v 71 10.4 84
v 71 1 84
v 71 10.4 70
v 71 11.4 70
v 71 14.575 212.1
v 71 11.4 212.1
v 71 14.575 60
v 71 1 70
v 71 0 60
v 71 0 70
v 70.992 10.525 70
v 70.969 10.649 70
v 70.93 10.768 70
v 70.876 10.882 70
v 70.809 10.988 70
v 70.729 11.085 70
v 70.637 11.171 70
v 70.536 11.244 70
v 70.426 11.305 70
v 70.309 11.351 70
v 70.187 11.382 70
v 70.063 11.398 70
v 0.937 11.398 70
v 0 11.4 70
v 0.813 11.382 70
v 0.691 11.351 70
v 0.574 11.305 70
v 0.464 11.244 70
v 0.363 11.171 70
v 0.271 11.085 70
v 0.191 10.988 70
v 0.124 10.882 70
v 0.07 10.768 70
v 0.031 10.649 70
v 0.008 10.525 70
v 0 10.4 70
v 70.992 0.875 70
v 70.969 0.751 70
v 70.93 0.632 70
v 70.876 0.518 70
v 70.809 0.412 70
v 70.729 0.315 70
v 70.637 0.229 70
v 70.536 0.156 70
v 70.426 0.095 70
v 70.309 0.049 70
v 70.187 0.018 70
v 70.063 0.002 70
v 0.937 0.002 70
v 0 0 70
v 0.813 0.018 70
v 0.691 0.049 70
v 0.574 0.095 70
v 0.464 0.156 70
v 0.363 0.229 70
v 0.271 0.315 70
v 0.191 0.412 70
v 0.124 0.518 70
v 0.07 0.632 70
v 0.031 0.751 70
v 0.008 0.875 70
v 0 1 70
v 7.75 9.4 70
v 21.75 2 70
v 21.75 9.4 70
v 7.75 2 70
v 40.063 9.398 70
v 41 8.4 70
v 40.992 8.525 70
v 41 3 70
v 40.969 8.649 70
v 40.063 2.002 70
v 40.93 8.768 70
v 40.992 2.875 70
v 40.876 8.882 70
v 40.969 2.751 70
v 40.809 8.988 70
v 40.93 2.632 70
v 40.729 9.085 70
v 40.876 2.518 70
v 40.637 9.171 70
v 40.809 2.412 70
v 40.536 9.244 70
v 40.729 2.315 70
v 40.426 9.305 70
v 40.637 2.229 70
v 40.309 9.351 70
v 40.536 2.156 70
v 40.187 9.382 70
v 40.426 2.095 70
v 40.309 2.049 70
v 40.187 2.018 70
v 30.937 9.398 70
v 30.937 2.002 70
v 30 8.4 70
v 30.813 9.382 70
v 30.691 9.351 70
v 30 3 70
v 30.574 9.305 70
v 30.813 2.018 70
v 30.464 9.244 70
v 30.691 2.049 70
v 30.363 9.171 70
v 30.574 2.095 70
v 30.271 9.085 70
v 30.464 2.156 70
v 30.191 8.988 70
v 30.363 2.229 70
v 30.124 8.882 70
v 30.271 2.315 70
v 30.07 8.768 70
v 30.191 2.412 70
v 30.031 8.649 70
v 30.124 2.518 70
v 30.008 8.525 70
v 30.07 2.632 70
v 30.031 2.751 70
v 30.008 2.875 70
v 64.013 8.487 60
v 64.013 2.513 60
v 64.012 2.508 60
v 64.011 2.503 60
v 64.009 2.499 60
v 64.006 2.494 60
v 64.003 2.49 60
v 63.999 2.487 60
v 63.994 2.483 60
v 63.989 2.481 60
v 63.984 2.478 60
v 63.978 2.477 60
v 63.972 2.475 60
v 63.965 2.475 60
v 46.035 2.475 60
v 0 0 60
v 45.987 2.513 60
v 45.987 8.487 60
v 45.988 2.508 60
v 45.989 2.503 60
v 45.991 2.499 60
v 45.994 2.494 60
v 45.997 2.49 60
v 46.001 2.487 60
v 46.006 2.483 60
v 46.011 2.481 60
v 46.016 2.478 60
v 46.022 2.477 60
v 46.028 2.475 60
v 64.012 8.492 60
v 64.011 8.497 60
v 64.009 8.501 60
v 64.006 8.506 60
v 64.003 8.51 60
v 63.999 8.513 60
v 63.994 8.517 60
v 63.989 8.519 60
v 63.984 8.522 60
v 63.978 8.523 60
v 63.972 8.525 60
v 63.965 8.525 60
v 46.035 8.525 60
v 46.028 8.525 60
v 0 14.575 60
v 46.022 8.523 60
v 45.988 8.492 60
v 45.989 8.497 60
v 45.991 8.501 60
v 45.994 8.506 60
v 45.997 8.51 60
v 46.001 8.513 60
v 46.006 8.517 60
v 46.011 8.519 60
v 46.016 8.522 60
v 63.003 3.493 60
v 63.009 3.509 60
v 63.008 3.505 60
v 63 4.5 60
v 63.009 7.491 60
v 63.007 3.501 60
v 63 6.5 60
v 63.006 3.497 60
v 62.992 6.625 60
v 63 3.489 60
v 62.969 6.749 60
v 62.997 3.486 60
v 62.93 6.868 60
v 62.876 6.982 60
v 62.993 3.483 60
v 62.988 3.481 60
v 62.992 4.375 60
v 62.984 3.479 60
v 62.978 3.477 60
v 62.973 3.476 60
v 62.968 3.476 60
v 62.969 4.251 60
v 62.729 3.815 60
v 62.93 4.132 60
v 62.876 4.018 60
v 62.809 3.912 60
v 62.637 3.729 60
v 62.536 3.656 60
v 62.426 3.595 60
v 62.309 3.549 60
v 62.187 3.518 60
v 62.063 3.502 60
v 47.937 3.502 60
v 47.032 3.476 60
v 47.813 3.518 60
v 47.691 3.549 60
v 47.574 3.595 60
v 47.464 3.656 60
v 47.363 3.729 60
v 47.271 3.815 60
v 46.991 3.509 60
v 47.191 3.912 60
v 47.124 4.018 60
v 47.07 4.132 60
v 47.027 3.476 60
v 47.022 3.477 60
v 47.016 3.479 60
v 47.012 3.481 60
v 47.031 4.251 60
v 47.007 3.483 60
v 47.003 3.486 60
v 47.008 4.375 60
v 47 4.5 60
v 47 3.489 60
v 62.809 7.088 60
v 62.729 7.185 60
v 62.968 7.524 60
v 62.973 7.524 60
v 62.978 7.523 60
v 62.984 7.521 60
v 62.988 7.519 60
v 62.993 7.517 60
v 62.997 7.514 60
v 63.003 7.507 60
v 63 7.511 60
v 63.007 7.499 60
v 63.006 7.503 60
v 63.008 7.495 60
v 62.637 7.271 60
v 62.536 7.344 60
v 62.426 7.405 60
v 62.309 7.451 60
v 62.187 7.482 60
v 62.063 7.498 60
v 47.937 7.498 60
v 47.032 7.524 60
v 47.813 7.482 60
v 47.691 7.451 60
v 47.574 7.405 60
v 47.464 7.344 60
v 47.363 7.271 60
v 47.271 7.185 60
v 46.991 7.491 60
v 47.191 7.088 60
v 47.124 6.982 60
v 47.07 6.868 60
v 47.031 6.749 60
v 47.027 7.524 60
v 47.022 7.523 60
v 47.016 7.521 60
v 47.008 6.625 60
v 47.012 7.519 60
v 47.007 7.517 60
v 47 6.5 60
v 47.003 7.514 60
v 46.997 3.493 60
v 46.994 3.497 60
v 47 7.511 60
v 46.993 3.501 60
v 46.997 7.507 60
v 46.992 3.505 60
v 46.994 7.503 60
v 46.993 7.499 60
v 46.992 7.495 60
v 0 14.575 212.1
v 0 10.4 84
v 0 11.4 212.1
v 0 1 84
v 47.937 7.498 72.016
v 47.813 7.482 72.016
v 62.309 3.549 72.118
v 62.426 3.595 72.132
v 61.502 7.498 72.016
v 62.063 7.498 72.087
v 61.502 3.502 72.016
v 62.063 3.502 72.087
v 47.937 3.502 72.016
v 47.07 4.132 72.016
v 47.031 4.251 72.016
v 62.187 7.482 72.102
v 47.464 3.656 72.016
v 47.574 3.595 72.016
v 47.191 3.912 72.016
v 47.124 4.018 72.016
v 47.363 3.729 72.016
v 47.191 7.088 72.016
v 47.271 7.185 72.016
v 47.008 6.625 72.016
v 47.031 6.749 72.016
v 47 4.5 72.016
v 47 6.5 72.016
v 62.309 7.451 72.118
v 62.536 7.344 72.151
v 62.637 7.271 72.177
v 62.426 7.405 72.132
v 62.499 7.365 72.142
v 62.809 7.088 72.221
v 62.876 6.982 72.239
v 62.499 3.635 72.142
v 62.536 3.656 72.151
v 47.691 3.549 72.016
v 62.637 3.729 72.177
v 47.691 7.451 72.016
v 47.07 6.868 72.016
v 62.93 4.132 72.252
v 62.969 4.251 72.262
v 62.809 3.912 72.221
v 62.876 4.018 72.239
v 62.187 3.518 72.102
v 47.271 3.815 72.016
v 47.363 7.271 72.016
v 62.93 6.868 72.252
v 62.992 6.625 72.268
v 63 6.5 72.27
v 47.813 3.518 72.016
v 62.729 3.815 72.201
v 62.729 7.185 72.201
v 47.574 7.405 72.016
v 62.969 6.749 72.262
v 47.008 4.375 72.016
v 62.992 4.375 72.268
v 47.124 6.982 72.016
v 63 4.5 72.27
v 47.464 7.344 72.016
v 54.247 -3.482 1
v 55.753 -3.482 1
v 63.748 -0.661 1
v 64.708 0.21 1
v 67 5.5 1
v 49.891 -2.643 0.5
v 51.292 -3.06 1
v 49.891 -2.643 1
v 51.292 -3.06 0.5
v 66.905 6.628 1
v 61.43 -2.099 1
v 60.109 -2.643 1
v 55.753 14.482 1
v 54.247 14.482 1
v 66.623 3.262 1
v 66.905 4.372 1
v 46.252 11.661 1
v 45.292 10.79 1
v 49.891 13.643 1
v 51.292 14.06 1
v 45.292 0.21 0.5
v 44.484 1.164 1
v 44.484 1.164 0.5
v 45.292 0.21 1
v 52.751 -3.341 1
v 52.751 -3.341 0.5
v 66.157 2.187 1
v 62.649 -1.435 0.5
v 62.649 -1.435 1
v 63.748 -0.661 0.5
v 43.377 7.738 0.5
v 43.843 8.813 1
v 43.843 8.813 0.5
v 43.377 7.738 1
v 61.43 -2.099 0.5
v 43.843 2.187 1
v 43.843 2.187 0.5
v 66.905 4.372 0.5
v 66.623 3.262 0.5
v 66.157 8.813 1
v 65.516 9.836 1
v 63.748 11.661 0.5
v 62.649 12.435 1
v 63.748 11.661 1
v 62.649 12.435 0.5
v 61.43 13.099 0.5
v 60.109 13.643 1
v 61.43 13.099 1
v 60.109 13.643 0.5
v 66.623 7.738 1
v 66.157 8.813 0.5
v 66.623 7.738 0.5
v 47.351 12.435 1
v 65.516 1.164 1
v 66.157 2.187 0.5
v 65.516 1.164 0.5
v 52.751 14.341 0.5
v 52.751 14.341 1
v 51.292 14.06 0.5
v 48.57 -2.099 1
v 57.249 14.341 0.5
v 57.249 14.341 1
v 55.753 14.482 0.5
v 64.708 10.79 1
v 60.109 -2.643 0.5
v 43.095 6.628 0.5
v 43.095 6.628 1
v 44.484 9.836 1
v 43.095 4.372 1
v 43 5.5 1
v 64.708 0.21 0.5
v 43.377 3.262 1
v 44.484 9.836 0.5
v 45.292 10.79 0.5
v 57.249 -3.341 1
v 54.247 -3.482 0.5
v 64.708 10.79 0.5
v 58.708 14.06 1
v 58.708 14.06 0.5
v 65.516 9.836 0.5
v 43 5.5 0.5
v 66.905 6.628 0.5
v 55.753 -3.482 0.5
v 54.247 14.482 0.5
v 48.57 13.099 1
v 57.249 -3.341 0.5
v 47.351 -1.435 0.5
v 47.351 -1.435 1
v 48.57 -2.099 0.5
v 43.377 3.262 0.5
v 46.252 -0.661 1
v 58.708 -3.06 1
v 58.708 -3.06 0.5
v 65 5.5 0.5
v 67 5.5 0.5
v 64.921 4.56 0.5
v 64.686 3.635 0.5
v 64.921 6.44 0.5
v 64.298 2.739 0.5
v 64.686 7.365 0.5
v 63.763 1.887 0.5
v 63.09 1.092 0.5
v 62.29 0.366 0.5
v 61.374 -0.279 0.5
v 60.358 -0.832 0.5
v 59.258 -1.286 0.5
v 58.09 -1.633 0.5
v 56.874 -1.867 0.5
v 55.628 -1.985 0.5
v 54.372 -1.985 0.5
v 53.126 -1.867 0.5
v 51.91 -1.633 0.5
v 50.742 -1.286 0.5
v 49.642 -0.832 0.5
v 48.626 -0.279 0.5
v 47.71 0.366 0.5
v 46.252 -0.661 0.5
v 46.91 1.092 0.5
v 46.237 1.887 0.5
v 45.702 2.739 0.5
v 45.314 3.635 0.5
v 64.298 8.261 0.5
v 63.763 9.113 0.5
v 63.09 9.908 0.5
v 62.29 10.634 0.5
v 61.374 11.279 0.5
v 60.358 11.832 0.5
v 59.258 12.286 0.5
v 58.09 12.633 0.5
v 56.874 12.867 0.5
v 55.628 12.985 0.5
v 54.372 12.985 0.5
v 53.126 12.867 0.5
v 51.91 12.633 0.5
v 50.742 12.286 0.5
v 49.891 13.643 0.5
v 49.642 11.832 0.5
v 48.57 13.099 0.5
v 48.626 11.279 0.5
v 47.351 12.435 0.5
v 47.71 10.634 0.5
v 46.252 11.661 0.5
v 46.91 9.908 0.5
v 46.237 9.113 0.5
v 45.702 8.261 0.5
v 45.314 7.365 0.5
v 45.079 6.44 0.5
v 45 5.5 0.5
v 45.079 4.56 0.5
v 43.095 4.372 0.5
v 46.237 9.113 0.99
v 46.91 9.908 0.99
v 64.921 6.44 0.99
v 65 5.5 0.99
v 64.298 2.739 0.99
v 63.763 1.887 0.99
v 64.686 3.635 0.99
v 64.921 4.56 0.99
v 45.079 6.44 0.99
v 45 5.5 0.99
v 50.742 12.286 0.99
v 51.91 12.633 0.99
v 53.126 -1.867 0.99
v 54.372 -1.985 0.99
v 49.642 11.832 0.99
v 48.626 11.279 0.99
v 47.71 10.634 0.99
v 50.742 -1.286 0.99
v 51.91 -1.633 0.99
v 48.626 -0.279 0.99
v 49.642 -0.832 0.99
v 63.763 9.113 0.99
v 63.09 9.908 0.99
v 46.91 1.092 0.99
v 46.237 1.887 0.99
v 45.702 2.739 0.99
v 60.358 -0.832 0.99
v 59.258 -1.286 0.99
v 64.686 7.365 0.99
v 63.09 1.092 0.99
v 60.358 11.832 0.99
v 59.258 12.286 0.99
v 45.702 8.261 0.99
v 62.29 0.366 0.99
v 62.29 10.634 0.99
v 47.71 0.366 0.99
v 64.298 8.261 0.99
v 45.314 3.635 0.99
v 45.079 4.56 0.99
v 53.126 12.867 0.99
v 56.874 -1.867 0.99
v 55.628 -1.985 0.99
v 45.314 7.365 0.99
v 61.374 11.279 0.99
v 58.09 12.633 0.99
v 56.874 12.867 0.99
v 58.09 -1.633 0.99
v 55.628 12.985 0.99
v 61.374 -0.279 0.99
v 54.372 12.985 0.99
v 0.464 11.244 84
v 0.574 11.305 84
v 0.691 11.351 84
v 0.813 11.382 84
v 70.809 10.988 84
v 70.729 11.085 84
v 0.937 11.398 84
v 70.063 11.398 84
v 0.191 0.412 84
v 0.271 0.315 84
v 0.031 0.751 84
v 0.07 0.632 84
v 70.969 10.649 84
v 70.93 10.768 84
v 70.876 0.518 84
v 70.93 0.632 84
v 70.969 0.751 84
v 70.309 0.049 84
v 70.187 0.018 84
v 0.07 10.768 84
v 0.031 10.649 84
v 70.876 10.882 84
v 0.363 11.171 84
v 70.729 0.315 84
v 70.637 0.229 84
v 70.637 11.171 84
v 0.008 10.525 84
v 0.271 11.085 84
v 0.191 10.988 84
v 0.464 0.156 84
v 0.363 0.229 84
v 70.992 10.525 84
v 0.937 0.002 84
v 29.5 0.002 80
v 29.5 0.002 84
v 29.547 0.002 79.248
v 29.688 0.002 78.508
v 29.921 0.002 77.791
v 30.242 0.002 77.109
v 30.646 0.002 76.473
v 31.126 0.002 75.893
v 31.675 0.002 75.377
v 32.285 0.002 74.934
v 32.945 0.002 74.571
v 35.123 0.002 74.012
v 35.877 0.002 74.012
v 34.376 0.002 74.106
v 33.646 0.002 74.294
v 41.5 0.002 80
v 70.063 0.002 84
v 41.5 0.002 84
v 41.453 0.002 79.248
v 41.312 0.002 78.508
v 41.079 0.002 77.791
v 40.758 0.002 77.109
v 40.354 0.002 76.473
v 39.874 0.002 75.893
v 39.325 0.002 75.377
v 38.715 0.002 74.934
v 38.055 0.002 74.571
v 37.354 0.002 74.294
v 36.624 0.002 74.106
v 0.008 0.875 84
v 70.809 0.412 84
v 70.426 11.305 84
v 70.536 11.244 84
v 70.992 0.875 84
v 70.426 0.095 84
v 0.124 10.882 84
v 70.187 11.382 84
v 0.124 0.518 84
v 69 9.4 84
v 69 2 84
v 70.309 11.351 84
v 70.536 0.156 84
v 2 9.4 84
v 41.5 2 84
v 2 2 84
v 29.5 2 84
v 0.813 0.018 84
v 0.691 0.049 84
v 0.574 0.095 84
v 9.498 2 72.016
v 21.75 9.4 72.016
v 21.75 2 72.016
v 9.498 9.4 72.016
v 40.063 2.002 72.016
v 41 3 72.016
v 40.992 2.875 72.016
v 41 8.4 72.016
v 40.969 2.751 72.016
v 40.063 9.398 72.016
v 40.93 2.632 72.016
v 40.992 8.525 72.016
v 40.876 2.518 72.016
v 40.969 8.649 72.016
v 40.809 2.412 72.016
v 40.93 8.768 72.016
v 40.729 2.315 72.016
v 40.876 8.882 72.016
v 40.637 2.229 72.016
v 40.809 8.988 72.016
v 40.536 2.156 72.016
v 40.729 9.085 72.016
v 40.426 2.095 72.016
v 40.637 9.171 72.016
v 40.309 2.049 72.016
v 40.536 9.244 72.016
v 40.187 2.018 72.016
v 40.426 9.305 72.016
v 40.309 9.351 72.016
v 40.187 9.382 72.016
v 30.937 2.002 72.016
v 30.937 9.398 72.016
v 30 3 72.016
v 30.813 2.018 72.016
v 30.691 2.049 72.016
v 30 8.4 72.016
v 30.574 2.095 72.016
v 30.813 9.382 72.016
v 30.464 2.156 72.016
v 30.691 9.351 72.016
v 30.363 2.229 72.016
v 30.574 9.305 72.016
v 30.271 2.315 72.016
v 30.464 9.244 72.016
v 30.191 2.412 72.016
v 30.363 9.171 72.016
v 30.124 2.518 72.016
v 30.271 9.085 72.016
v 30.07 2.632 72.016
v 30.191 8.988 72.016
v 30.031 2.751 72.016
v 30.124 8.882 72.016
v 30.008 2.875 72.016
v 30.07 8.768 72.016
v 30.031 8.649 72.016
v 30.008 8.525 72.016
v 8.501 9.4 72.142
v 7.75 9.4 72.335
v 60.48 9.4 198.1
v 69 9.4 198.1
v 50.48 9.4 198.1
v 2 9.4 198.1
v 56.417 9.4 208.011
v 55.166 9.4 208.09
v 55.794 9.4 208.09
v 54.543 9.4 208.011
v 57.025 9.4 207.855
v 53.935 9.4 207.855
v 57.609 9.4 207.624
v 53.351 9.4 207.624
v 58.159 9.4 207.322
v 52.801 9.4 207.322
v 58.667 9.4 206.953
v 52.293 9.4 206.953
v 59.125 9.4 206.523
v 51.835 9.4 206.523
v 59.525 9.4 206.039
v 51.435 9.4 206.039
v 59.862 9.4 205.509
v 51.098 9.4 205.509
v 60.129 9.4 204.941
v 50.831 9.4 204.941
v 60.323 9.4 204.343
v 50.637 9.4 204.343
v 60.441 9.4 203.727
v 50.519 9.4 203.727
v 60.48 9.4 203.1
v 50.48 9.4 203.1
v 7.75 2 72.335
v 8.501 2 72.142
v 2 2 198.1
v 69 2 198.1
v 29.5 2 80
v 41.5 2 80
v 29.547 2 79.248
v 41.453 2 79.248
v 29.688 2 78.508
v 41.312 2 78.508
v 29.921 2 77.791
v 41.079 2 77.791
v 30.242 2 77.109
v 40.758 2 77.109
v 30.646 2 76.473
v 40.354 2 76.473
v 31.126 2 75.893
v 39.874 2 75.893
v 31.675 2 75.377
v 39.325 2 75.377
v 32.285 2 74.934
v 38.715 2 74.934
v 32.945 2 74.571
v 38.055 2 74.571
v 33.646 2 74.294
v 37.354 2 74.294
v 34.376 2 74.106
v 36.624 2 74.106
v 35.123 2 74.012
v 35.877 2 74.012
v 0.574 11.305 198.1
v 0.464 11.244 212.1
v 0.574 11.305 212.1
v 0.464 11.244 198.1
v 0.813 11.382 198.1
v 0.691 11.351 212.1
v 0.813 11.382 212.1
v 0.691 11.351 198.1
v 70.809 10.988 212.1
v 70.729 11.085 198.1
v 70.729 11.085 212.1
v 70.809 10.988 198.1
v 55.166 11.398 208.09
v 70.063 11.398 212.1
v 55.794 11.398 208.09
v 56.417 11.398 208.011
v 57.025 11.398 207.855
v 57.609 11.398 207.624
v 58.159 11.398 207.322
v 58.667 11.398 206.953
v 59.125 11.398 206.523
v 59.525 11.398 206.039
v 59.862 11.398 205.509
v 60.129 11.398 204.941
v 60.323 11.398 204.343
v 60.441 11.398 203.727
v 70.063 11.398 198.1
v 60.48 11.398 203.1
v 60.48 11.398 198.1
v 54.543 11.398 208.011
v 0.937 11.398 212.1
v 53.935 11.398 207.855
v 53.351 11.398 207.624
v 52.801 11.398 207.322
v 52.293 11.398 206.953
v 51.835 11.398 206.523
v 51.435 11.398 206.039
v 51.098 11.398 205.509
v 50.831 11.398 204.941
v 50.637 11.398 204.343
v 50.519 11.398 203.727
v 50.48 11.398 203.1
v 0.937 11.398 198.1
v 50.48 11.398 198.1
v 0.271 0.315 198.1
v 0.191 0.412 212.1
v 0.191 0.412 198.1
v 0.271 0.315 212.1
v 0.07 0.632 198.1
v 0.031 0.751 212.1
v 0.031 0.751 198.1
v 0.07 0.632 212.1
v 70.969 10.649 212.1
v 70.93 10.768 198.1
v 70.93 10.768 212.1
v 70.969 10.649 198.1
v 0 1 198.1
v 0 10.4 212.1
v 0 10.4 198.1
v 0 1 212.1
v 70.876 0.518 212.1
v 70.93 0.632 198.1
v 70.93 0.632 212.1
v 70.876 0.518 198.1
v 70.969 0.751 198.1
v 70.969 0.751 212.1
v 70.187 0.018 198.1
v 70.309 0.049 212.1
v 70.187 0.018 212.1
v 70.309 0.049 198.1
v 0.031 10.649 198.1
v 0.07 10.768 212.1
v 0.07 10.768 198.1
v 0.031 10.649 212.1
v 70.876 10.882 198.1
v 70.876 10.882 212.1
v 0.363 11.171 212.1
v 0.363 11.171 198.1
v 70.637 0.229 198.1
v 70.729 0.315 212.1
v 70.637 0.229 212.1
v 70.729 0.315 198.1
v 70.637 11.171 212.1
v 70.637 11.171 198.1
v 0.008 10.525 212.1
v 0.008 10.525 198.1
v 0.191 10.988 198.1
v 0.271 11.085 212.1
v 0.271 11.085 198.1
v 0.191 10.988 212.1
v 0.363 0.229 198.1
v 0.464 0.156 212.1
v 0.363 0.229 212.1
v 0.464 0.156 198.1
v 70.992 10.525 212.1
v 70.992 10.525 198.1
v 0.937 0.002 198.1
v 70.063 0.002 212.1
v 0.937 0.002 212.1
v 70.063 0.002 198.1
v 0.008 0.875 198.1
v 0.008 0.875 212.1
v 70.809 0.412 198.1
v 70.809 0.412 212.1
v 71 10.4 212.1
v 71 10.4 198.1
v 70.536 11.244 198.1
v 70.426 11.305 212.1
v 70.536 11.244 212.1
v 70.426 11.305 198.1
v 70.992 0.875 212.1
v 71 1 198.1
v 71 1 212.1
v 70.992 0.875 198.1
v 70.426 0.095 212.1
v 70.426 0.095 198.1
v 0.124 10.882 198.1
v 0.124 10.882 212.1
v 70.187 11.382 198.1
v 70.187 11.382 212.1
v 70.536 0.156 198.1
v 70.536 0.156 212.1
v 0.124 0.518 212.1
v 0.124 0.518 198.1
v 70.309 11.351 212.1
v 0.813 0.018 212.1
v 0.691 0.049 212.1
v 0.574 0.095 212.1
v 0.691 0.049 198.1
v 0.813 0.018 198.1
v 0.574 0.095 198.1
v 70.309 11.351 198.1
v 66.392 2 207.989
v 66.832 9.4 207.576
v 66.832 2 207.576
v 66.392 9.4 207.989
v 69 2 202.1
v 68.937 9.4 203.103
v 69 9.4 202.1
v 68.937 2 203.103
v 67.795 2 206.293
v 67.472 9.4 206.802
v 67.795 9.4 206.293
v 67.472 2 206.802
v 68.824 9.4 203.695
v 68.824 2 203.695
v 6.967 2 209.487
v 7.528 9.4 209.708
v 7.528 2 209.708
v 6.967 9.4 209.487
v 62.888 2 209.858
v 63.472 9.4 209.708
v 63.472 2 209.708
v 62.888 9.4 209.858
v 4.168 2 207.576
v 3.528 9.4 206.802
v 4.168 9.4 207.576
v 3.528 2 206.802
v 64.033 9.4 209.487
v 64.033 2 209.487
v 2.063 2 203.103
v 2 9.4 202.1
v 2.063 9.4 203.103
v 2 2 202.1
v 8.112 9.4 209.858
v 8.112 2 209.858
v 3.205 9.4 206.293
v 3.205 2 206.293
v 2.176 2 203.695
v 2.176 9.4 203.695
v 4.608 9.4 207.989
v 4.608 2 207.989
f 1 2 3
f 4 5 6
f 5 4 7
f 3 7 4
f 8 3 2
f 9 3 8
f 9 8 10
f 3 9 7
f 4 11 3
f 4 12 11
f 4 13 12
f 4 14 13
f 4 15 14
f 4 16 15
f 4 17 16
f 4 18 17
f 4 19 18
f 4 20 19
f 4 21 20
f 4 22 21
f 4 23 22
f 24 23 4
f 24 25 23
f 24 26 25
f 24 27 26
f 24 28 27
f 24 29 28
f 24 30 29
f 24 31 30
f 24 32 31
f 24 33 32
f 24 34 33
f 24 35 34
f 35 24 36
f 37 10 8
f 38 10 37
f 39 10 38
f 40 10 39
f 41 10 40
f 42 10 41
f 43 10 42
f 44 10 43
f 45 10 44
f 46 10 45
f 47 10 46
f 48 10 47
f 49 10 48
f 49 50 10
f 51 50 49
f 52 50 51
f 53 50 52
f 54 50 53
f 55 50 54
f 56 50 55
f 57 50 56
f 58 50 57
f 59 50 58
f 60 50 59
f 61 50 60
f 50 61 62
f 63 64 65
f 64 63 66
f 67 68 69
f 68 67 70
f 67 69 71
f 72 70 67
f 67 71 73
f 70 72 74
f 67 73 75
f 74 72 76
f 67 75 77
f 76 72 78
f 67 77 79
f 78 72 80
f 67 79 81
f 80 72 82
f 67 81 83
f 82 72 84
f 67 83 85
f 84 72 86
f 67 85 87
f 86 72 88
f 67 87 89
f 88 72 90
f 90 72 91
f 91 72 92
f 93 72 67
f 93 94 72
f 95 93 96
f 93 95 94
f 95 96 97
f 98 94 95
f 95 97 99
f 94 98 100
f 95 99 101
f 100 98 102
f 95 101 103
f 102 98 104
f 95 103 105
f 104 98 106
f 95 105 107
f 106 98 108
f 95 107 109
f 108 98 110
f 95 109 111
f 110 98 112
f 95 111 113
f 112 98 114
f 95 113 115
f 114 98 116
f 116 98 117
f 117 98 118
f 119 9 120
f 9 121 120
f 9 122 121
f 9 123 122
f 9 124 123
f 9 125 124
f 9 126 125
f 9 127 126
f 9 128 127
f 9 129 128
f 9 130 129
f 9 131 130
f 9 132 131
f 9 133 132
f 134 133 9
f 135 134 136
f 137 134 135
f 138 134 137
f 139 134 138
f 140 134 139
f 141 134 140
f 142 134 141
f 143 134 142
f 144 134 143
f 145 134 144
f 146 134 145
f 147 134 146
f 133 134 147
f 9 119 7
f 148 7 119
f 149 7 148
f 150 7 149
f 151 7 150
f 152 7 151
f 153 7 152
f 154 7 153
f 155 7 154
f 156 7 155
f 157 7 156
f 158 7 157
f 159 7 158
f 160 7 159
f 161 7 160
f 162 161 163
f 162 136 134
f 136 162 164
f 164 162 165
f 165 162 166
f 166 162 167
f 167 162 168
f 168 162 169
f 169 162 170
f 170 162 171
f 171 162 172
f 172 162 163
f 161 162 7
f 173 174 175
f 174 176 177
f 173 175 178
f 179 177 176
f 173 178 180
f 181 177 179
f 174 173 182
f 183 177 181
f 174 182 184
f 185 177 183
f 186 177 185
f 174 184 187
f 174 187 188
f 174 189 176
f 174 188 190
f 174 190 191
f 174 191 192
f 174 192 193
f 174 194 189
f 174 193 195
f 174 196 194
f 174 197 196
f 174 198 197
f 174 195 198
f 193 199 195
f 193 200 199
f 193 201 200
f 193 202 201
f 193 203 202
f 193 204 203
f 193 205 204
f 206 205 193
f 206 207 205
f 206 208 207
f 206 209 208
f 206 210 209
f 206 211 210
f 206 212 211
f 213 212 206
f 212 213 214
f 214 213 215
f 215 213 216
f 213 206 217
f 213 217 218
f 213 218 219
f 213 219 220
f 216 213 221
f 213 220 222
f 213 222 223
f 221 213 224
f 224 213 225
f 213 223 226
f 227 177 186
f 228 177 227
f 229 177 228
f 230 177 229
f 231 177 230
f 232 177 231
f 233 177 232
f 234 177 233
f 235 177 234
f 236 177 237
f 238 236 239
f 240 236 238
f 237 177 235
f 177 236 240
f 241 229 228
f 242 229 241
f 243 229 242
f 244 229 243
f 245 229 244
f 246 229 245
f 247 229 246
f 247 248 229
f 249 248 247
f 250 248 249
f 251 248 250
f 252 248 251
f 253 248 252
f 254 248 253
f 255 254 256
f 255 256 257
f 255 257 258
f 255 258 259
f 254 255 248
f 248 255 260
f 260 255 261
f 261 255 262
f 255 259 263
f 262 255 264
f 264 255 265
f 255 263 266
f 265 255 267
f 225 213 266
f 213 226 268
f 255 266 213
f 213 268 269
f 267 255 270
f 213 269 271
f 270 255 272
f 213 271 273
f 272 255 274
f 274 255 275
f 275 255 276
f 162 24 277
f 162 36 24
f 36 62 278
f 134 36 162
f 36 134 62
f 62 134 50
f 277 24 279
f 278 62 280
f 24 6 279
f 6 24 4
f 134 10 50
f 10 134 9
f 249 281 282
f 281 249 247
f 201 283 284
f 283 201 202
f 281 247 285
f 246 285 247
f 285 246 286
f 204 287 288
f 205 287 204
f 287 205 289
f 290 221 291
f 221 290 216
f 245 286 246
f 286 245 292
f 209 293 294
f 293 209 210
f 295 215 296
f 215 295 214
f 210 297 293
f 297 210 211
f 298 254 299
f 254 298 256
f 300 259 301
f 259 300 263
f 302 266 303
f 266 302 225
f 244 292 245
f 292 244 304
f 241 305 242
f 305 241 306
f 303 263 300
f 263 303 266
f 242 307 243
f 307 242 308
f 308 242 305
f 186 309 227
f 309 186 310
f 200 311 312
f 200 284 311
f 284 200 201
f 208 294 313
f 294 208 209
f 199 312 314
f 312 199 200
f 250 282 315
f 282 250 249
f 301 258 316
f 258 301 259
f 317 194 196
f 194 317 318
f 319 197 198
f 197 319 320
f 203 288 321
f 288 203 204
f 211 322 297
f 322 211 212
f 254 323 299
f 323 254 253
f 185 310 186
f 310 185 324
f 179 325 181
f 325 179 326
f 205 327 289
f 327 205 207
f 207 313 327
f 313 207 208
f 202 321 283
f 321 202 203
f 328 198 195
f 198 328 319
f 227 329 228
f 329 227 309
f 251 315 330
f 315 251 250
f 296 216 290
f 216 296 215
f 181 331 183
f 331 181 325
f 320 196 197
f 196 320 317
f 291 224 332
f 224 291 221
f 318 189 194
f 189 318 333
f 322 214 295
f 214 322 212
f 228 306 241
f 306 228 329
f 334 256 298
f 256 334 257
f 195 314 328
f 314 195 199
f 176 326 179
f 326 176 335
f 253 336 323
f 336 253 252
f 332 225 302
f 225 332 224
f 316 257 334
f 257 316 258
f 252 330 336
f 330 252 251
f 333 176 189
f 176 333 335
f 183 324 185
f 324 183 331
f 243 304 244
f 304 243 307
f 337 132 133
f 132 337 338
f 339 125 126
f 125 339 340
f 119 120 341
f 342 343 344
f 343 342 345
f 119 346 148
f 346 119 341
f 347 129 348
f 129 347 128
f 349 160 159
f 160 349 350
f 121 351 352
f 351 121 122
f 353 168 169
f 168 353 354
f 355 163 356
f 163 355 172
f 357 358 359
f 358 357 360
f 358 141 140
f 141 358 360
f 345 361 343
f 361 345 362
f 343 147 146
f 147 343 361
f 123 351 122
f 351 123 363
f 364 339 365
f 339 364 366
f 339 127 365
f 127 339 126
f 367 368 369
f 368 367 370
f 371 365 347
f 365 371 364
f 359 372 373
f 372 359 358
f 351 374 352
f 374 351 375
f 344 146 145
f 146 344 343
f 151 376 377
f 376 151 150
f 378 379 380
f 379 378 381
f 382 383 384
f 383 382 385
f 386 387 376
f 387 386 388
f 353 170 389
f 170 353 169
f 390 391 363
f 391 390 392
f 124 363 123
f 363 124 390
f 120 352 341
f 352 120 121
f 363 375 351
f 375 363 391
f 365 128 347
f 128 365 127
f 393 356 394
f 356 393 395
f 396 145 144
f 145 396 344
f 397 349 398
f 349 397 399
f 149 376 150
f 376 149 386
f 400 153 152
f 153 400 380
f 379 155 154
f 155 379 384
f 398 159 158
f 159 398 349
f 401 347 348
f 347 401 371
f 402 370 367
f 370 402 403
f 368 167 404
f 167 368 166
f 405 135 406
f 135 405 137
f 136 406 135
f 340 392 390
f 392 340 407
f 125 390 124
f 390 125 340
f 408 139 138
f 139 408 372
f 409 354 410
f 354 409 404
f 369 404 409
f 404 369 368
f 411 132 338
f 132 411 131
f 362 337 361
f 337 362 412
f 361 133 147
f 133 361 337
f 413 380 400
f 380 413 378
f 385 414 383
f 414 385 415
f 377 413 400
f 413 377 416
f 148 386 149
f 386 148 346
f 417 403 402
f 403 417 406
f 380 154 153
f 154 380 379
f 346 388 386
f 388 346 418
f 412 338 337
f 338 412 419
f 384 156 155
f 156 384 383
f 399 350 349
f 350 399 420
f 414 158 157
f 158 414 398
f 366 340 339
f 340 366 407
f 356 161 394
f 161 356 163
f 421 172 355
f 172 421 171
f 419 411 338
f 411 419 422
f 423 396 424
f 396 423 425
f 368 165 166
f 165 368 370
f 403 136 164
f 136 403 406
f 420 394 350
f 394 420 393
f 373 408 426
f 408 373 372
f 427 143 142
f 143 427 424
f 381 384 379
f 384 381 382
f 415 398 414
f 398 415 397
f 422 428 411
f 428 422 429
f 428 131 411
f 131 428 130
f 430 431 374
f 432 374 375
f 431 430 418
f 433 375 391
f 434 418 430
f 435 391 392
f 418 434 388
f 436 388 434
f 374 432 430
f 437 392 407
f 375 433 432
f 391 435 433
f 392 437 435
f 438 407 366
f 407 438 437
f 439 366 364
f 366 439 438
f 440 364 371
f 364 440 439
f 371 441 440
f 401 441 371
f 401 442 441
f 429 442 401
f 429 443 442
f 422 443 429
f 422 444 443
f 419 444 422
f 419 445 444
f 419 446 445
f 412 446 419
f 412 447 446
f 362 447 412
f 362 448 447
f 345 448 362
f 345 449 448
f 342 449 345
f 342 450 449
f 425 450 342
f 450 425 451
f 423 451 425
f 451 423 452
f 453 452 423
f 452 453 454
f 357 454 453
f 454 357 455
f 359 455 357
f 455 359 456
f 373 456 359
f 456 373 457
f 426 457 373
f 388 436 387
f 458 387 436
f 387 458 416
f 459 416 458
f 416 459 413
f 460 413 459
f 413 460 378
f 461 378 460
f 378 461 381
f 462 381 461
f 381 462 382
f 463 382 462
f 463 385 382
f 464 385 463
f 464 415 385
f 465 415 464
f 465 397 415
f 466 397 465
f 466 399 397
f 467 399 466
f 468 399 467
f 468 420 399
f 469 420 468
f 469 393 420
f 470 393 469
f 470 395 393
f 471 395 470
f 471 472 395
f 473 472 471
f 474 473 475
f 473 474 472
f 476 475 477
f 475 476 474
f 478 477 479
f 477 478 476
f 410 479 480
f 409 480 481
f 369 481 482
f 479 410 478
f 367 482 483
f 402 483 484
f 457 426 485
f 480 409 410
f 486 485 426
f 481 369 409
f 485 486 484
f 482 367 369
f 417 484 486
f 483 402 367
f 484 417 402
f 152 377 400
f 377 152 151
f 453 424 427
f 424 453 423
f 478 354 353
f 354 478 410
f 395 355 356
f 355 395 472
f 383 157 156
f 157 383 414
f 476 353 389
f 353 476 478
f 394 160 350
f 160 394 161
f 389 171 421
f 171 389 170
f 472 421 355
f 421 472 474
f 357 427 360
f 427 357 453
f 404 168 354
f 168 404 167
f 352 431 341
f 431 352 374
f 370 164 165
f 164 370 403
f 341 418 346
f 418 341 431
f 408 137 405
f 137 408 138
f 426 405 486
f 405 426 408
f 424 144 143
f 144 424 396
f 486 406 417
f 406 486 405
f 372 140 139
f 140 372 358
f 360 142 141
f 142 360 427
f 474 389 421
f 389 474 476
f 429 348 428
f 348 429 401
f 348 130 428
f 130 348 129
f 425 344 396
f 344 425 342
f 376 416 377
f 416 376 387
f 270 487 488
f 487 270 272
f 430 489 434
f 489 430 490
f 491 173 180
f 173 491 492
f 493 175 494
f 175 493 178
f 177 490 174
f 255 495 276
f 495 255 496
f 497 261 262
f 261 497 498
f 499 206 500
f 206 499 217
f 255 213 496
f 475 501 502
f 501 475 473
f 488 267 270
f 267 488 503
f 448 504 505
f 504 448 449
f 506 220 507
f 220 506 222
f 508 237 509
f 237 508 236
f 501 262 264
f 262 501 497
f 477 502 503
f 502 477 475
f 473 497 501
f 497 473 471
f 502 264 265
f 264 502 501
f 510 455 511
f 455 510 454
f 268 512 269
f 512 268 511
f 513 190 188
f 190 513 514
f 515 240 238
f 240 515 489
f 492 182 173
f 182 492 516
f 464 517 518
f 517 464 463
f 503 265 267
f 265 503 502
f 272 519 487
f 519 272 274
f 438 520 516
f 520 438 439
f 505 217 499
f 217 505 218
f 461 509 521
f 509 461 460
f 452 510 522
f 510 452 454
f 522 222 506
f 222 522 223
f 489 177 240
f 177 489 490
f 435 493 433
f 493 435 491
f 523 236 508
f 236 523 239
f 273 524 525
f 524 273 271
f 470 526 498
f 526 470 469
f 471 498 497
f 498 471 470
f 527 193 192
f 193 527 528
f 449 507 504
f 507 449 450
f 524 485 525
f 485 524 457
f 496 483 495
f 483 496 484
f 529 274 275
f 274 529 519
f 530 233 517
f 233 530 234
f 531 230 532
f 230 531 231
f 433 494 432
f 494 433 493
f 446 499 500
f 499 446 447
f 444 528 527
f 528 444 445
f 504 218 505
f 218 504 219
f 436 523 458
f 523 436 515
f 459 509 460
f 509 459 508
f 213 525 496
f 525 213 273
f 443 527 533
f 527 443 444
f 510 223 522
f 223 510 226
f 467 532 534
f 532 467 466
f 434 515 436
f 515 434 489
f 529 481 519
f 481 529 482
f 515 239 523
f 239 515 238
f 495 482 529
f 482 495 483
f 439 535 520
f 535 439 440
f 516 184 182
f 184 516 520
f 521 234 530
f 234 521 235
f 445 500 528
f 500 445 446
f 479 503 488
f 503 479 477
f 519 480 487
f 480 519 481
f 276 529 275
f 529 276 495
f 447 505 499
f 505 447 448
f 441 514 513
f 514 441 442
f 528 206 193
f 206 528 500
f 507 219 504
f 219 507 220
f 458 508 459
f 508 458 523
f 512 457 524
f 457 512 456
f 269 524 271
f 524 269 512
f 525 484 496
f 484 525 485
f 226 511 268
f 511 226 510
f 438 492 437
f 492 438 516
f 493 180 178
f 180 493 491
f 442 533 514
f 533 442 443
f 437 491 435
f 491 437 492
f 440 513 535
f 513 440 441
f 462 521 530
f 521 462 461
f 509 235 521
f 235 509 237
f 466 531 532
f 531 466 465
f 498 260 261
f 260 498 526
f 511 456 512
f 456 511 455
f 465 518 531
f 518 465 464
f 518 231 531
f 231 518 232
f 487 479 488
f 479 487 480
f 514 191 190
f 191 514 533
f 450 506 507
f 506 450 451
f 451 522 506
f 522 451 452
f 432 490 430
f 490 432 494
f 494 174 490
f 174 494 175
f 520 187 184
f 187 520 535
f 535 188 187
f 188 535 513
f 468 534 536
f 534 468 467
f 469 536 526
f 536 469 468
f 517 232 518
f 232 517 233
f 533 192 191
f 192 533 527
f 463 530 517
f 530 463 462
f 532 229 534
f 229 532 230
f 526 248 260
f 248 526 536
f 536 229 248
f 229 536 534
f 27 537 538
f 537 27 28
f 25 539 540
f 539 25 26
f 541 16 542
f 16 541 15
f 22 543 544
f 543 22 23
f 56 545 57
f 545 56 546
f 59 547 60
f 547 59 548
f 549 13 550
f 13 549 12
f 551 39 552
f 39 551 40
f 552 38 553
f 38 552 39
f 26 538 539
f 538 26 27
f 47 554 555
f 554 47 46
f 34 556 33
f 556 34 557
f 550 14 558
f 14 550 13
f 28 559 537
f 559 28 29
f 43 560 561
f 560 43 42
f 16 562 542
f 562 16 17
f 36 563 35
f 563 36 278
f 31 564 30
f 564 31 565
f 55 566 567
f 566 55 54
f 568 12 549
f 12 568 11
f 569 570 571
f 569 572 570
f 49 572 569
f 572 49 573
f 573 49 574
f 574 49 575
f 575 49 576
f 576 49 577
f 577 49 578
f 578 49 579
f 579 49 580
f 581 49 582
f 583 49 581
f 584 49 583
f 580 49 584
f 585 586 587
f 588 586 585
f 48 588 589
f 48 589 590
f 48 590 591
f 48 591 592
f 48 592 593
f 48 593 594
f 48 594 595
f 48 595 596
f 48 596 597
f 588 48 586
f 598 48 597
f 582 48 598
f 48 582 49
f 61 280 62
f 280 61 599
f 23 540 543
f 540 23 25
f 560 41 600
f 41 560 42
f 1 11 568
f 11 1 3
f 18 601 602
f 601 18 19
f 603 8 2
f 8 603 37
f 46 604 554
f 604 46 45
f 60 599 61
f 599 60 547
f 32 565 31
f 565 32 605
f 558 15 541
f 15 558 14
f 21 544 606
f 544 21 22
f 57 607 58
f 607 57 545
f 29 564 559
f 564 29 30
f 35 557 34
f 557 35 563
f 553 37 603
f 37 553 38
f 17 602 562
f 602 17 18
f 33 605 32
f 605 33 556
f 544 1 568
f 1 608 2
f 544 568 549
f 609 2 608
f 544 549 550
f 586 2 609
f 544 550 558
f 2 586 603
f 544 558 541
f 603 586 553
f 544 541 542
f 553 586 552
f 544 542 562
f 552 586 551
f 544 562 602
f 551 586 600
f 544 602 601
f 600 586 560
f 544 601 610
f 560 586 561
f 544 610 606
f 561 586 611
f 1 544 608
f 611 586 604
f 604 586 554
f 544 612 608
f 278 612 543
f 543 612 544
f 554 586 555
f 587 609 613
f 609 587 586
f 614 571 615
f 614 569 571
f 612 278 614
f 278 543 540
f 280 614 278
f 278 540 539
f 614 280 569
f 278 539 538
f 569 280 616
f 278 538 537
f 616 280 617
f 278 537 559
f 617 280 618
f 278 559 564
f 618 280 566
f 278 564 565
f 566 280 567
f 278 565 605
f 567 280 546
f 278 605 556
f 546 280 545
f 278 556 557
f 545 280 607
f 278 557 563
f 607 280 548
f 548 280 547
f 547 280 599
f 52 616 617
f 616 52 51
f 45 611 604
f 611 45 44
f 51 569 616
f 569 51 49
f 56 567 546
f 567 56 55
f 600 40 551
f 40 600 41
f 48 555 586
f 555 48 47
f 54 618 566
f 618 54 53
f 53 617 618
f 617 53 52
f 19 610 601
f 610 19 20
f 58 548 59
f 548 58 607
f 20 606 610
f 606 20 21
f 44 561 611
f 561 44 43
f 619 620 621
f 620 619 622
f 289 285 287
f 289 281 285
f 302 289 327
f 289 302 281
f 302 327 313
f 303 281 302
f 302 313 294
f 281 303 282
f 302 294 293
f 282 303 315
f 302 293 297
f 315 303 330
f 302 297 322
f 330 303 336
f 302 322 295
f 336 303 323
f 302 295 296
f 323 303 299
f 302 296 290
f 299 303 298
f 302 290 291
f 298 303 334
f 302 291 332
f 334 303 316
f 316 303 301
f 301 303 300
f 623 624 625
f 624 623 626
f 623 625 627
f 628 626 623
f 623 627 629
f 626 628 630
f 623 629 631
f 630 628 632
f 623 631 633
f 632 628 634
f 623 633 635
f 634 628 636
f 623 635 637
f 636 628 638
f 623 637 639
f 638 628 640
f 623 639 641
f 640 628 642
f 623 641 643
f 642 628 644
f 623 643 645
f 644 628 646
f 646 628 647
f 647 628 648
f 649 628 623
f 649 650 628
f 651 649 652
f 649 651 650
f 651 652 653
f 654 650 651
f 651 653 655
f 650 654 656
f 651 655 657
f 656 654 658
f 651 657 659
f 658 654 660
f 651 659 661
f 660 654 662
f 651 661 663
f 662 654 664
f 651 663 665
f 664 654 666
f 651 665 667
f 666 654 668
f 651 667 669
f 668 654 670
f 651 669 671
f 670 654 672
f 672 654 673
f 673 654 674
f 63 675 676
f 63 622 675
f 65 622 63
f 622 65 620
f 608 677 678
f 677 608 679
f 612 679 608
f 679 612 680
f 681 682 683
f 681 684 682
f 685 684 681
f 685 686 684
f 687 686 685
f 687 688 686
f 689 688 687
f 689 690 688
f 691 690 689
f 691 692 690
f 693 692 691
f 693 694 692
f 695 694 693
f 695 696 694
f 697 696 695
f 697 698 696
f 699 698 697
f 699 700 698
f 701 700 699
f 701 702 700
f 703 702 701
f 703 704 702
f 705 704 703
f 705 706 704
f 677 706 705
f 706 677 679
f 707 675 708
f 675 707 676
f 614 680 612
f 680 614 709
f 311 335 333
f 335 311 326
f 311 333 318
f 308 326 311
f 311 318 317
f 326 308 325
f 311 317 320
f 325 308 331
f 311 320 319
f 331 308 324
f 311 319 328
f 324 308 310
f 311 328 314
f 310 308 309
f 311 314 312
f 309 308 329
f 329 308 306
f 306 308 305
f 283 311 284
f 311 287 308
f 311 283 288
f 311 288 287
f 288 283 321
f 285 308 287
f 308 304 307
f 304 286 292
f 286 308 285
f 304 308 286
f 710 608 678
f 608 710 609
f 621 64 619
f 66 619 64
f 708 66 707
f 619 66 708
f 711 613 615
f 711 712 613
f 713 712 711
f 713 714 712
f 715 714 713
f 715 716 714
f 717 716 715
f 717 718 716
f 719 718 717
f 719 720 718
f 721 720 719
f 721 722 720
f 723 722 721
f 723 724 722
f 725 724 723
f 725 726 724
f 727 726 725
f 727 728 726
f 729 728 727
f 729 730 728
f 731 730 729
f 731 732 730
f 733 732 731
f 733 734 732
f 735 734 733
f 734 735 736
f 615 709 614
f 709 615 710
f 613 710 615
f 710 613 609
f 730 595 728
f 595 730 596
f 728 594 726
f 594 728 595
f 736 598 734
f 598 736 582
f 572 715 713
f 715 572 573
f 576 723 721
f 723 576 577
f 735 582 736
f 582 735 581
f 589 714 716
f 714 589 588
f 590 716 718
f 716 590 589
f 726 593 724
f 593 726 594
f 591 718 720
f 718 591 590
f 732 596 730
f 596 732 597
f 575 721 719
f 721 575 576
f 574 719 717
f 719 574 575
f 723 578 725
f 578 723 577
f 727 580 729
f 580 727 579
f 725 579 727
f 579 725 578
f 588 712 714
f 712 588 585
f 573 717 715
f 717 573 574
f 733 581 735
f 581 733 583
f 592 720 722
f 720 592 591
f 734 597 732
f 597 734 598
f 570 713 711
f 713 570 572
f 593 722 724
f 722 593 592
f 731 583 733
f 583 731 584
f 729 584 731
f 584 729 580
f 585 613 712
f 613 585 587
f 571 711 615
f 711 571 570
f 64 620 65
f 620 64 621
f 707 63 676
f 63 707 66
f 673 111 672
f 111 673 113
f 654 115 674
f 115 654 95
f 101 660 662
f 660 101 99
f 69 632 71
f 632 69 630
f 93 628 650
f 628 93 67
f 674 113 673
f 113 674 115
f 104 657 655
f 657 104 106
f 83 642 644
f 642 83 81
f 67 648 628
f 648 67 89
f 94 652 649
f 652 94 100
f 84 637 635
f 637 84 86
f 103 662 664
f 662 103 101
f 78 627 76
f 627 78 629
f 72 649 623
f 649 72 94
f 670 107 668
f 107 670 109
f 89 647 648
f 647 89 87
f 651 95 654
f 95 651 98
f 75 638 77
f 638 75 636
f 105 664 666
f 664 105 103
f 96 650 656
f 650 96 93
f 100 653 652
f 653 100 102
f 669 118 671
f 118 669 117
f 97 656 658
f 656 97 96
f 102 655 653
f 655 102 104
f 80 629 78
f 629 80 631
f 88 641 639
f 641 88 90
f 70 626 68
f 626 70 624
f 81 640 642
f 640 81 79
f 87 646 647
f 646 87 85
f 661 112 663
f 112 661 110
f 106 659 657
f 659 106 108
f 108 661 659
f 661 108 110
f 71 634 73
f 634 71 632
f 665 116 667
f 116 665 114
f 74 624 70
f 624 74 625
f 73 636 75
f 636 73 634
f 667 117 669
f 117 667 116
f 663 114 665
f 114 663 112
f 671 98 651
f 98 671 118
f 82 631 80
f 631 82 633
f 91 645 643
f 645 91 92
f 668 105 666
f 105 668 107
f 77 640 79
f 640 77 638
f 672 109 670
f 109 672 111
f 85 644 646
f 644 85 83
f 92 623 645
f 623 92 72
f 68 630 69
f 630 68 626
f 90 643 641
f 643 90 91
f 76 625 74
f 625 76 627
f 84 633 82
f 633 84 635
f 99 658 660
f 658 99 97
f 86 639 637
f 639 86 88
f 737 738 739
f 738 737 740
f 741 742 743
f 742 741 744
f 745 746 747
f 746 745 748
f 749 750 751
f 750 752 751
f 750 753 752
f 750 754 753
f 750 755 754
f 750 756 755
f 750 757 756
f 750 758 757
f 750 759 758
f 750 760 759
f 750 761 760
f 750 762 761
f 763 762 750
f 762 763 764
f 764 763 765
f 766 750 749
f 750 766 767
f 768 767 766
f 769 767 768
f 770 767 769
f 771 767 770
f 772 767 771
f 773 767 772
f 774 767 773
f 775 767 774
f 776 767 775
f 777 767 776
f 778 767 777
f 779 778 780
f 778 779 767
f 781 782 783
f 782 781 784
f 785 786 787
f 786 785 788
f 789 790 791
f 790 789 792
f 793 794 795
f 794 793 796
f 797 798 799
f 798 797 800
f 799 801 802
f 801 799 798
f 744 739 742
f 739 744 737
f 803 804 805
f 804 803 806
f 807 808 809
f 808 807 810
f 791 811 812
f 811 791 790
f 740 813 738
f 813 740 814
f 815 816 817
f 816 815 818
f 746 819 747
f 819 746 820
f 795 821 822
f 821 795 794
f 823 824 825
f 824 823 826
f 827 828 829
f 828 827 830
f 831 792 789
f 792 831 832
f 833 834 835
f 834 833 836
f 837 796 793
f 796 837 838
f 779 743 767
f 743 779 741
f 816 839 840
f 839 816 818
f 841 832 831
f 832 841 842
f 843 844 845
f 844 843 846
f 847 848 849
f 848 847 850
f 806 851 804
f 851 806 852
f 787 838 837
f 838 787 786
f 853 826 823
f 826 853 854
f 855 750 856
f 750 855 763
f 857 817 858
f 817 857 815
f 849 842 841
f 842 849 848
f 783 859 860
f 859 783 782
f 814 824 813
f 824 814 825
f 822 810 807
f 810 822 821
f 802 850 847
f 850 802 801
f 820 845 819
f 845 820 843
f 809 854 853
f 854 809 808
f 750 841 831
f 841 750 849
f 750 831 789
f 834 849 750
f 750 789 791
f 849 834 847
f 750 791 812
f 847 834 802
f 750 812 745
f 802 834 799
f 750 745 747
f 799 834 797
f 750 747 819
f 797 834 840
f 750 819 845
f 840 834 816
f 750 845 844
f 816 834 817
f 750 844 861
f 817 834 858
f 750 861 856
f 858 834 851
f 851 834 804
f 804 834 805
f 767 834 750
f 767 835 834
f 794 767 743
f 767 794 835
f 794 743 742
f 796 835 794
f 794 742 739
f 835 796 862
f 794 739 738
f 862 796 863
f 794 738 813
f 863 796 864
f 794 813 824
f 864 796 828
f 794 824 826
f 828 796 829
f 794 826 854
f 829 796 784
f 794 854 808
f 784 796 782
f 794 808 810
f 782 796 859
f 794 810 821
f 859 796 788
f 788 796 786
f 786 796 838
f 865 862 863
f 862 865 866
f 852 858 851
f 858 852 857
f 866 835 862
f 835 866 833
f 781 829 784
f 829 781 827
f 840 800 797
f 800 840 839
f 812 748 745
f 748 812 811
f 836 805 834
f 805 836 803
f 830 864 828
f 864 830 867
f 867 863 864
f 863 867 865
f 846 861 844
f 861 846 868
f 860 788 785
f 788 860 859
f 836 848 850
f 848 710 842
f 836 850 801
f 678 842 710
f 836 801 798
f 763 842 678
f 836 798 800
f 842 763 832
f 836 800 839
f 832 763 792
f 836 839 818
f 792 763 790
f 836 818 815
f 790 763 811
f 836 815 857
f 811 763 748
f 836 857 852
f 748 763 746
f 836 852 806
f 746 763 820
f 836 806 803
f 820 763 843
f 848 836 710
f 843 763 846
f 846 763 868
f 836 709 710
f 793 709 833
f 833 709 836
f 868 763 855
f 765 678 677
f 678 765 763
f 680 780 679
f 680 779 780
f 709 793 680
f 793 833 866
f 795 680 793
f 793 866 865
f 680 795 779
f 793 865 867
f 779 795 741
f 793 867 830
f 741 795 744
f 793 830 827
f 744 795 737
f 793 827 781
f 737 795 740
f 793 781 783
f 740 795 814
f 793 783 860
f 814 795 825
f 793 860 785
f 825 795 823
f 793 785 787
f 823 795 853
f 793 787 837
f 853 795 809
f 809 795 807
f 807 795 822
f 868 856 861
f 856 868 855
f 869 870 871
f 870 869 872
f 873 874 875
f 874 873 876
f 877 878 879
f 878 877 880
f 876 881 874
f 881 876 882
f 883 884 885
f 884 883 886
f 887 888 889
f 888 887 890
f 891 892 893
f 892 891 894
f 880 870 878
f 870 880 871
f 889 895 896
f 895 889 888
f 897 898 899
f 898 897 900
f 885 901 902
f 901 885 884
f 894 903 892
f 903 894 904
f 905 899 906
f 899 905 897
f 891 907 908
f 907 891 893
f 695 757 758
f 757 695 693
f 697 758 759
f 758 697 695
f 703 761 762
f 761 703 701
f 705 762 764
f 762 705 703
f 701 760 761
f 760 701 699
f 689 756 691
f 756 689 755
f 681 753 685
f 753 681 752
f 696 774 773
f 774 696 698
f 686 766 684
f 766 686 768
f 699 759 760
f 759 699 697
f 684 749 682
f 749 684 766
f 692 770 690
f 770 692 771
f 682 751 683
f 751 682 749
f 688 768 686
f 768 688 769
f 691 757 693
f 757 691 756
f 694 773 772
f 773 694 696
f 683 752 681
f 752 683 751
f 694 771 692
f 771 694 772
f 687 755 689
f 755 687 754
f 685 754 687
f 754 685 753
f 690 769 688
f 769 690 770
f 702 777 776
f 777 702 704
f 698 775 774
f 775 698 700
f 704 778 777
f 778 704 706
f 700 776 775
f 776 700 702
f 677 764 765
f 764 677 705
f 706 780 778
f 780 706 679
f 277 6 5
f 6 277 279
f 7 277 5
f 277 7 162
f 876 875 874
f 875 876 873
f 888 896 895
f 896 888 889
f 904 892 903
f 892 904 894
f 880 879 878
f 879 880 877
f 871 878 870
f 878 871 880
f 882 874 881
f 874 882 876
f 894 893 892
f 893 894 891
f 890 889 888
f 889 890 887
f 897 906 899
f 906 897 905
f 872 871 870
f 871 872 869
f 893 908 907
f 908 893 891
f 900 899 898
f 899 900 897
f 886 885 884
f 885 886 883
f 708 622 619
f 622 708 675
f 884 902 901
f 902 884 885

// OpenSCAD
// file: ../lib/basics.scad
// ## `basics.scad`
// This library contains basic elements to construct mobile device augmentations.

// ### `roundedCube(dimension,edgeRadius)`
// A cube with rounded edges on the depth axis. This function is helpful for creating simple phone shapes.
// #### Where
// * `dimension=[width,depth,height]`: the size of the cube
// * `edgeRadius`: the radius of the rounded edges 
module roundedCube(dimension=[10,10,10],edgeRadius=1){
    translate([0,dimension[1],0])
		rotate([90,0,0])
			hull(){
        		translate([edgeRadius,edgeRadius,0])
					cylinder(r=edgeRadius,h=dimension[1]);
        		translate([dimension[0]-edgeRadius,edgeRadius,0])
					cylinder(r=edgeRadius,h=dimension[1]);
        		translate([edgeRadius,dimension[2]-edgeRadius,0])
					cylinder(r=edgeRadius,h=dimension[1]);
        		translate([dimension[0]-edgeRadius,dimension[2]-edgeRadius,0])
					cylinder(r=edgeRadius,h=dimension[1]);
    		}
}

// ### `bottomHolder(deviceWidth,deviceDepth,deviceEdgeRadius,deviceHeightInHolder,wallThickness,holderEdgeRadius)`
// A basic generic element to hold the bottom part of a device
// #### Where
// * `deviceWidth`: the width of the device to be held
// * `deviceDepth`: the depth of the device to be held
// * `deviceEdgeRadius`: the edge radius of the device to be held
// * `deviceHeightInHolder`: the height of the part of the holder covering the device
// * `wallThickness`: the holder's wall thickness
// * `holderEdgeRadius`: the holder's edge radius
module bottomHolder(deviceWidth=10,deviceDepth=10,deviceEdgeRadius=1,
deviceHeightInHolder=10,wallThickness=1,holderEdgeRadius=1){
	difference(){
		translate([0,deviceDepth+wallThickness*2,0])
			rotate([90,0,0])
				roundedCube([deviceWidth+wallThickness*2,deviceHeightInHolder+wallThickness,
				deviceDepth+wallThickness*2],holderEdgeRadius);
		translate([wallThickness,wallThickness,wallThickness])
			roundedCube([deviceWidth,deviceDepth,
			deviceHeightInHolder+deviceEdgeRadius],deviceEdgeRadius);
	}
}

// ### `topHolder(deviceWidth,deviceDepth,deviceEdgeRadius,deviceHeightInHolder,wallThickness,lipsWidth,holderEdgeRadius)`
// A basic generic element to hold the top part of a device
// #### Where
// * `deviceWidth`: the width of the device to be held
// * `deviceDepth`: the depth of the device to be held
// * `deviceEdgeRadius`: the edge radius of the device to be held
// * `deviceHeightInHolder`: the height of the part of the holder covering the device
// * `wallThickness`: the holder's wall thickness
// * `lipsWidth`: size of the lips holding the device
// * `holderEdgeRadius`: the holder's edge radius
module topHolder(deviceWidth=10,deviceDepth=10,deviceEdgeRadius=1,deviceHeightInHolder=10,
wallThickness=1,lipsWidth=2,holderEdgeRadius=1){
	difference(){
		translate([0,deviceDepth+wallThickness*2,0])rotate([90,0,0])
			roundedCube([deviceWidth+wallThickness*2,deviceHeightInHolder+wallThickness,
			deviceDepth+wallThickness*2],holderEdgeRadius);
		translate([wallThickness,wallThickness,-wallThickness*2])
			roundedCube([deviceWidth,deviceDepth,deviceHeightInHolder],deviceEdgeRadius);
		//translate([wallThickness+lipsWidth,-0.01,-wallThickness-lipsWidth-0.85]) // TODO: 0.85 wrong here: needs to be fixed
		//	roundedCube([deviceWidth-lipsWidth*2,wallThickness+0.02,deviceHeightInHolder],
	//		deviceEdgeRadius*((deviceWidth-lipsWidth*2)/deviceWidth));
	}
}

// ### `rectangleCircularHorn(rectangleWidth,rectangleHeight,circleRadius,hornLength,wallThickness,hornDeformationFactor,hornDerivation,endsHeight)`
// A horn with a square termination on one side and a circle termination on the other.
// #### Where
// * `rectangleWidth`: the width of the rectangular termination
// * `rectangleHeight`: the height of the rectangular termination
// * `circleRadius`: the radius of the circular termination
// * `hornLength`: the length of the horn
// * `wallThickness`: the thickness of the walls
// * `hornDeformationFactor`: controls the vertical flatness of the horn with (1=perfect circle, >1=flatened circle) 
// * `hornDerivation`: displace the position of the circular end relatively to the rectangular end on the horizontal axis
// * `endsHeight`: the height of the two ends
module rectangleCircularHorn(rectangleWidth=10,rectangleHeight=10,circleRadius=10,hornLength=10,wallThickness=1,
hornDeformationFactor=1,hornDerivation=0,endsHeight=0.5){
	difference(){
		hull(){
			cube([rectangleWidth+wallThickness,rectangleHeight+wallThickness,endsHeight],center=true);
			translate([hornDerivation,0,hornLength-endsHeight*2])
				scale([1,hornDeformationFactor,1])
					cylinder(r=circleRadius+wallThickness,h=endsHeight);
		}
		hull(){
			translate([0,0,-0.01])
				cube([rectangleWidth,rectangleHeight,endsHeight],center=true);
			translate([hornDerivation,0,hornLength-endsHeight*2+0.01])
				scale([1,hornDeformationFactor,1])
					cylinder(r=circleRadius,h=endsHeight);
		}
	}
}

// ### `halfSphere(radius)`
// A half sphere useful to create tops.
// #### Where
// * `radius`: the radius of the half sphere
module halfSphere(radius=10){
	difference(){
		translate([radius,radius,0])sphere(radius);
		translate([0,0,-radius*2])cube([radius*2,radius*2,radius*2]);
	}
}

// ### `halfCylinder(dimension=[10,10,10])`
// A half cylinder with controllable height.
// #### Where
// * `dimension=[width,depth,height]`: the size of the half cylinder
module halfCylinder(dimension=[10,10,10]){
	rotate([-90,0,0])scale([1,dimension[2]/dimension[0],1])difference(){
		translate([dimension[0]/2,0,0.01])cylinder(r=dimension[0]/2,h=dimension[1]);
		cube([dimension[0],dimension[0],dimension[1]+0.02]);
	}
}
// main file
include <../lib/iPhone6.scad>

$fn=50;

iPhone6_CaseWithSpeakerMouthPipe();
translate([iPhone6_Module_WallThickness,iPhone6_Module_WallThickness,iPhone6_Module_WallThickness+iPhone6_SpeakerMouthPipe_HornLength+iPhone6_SpeakerMouthPipe_BaseThickness])iPhone6();
